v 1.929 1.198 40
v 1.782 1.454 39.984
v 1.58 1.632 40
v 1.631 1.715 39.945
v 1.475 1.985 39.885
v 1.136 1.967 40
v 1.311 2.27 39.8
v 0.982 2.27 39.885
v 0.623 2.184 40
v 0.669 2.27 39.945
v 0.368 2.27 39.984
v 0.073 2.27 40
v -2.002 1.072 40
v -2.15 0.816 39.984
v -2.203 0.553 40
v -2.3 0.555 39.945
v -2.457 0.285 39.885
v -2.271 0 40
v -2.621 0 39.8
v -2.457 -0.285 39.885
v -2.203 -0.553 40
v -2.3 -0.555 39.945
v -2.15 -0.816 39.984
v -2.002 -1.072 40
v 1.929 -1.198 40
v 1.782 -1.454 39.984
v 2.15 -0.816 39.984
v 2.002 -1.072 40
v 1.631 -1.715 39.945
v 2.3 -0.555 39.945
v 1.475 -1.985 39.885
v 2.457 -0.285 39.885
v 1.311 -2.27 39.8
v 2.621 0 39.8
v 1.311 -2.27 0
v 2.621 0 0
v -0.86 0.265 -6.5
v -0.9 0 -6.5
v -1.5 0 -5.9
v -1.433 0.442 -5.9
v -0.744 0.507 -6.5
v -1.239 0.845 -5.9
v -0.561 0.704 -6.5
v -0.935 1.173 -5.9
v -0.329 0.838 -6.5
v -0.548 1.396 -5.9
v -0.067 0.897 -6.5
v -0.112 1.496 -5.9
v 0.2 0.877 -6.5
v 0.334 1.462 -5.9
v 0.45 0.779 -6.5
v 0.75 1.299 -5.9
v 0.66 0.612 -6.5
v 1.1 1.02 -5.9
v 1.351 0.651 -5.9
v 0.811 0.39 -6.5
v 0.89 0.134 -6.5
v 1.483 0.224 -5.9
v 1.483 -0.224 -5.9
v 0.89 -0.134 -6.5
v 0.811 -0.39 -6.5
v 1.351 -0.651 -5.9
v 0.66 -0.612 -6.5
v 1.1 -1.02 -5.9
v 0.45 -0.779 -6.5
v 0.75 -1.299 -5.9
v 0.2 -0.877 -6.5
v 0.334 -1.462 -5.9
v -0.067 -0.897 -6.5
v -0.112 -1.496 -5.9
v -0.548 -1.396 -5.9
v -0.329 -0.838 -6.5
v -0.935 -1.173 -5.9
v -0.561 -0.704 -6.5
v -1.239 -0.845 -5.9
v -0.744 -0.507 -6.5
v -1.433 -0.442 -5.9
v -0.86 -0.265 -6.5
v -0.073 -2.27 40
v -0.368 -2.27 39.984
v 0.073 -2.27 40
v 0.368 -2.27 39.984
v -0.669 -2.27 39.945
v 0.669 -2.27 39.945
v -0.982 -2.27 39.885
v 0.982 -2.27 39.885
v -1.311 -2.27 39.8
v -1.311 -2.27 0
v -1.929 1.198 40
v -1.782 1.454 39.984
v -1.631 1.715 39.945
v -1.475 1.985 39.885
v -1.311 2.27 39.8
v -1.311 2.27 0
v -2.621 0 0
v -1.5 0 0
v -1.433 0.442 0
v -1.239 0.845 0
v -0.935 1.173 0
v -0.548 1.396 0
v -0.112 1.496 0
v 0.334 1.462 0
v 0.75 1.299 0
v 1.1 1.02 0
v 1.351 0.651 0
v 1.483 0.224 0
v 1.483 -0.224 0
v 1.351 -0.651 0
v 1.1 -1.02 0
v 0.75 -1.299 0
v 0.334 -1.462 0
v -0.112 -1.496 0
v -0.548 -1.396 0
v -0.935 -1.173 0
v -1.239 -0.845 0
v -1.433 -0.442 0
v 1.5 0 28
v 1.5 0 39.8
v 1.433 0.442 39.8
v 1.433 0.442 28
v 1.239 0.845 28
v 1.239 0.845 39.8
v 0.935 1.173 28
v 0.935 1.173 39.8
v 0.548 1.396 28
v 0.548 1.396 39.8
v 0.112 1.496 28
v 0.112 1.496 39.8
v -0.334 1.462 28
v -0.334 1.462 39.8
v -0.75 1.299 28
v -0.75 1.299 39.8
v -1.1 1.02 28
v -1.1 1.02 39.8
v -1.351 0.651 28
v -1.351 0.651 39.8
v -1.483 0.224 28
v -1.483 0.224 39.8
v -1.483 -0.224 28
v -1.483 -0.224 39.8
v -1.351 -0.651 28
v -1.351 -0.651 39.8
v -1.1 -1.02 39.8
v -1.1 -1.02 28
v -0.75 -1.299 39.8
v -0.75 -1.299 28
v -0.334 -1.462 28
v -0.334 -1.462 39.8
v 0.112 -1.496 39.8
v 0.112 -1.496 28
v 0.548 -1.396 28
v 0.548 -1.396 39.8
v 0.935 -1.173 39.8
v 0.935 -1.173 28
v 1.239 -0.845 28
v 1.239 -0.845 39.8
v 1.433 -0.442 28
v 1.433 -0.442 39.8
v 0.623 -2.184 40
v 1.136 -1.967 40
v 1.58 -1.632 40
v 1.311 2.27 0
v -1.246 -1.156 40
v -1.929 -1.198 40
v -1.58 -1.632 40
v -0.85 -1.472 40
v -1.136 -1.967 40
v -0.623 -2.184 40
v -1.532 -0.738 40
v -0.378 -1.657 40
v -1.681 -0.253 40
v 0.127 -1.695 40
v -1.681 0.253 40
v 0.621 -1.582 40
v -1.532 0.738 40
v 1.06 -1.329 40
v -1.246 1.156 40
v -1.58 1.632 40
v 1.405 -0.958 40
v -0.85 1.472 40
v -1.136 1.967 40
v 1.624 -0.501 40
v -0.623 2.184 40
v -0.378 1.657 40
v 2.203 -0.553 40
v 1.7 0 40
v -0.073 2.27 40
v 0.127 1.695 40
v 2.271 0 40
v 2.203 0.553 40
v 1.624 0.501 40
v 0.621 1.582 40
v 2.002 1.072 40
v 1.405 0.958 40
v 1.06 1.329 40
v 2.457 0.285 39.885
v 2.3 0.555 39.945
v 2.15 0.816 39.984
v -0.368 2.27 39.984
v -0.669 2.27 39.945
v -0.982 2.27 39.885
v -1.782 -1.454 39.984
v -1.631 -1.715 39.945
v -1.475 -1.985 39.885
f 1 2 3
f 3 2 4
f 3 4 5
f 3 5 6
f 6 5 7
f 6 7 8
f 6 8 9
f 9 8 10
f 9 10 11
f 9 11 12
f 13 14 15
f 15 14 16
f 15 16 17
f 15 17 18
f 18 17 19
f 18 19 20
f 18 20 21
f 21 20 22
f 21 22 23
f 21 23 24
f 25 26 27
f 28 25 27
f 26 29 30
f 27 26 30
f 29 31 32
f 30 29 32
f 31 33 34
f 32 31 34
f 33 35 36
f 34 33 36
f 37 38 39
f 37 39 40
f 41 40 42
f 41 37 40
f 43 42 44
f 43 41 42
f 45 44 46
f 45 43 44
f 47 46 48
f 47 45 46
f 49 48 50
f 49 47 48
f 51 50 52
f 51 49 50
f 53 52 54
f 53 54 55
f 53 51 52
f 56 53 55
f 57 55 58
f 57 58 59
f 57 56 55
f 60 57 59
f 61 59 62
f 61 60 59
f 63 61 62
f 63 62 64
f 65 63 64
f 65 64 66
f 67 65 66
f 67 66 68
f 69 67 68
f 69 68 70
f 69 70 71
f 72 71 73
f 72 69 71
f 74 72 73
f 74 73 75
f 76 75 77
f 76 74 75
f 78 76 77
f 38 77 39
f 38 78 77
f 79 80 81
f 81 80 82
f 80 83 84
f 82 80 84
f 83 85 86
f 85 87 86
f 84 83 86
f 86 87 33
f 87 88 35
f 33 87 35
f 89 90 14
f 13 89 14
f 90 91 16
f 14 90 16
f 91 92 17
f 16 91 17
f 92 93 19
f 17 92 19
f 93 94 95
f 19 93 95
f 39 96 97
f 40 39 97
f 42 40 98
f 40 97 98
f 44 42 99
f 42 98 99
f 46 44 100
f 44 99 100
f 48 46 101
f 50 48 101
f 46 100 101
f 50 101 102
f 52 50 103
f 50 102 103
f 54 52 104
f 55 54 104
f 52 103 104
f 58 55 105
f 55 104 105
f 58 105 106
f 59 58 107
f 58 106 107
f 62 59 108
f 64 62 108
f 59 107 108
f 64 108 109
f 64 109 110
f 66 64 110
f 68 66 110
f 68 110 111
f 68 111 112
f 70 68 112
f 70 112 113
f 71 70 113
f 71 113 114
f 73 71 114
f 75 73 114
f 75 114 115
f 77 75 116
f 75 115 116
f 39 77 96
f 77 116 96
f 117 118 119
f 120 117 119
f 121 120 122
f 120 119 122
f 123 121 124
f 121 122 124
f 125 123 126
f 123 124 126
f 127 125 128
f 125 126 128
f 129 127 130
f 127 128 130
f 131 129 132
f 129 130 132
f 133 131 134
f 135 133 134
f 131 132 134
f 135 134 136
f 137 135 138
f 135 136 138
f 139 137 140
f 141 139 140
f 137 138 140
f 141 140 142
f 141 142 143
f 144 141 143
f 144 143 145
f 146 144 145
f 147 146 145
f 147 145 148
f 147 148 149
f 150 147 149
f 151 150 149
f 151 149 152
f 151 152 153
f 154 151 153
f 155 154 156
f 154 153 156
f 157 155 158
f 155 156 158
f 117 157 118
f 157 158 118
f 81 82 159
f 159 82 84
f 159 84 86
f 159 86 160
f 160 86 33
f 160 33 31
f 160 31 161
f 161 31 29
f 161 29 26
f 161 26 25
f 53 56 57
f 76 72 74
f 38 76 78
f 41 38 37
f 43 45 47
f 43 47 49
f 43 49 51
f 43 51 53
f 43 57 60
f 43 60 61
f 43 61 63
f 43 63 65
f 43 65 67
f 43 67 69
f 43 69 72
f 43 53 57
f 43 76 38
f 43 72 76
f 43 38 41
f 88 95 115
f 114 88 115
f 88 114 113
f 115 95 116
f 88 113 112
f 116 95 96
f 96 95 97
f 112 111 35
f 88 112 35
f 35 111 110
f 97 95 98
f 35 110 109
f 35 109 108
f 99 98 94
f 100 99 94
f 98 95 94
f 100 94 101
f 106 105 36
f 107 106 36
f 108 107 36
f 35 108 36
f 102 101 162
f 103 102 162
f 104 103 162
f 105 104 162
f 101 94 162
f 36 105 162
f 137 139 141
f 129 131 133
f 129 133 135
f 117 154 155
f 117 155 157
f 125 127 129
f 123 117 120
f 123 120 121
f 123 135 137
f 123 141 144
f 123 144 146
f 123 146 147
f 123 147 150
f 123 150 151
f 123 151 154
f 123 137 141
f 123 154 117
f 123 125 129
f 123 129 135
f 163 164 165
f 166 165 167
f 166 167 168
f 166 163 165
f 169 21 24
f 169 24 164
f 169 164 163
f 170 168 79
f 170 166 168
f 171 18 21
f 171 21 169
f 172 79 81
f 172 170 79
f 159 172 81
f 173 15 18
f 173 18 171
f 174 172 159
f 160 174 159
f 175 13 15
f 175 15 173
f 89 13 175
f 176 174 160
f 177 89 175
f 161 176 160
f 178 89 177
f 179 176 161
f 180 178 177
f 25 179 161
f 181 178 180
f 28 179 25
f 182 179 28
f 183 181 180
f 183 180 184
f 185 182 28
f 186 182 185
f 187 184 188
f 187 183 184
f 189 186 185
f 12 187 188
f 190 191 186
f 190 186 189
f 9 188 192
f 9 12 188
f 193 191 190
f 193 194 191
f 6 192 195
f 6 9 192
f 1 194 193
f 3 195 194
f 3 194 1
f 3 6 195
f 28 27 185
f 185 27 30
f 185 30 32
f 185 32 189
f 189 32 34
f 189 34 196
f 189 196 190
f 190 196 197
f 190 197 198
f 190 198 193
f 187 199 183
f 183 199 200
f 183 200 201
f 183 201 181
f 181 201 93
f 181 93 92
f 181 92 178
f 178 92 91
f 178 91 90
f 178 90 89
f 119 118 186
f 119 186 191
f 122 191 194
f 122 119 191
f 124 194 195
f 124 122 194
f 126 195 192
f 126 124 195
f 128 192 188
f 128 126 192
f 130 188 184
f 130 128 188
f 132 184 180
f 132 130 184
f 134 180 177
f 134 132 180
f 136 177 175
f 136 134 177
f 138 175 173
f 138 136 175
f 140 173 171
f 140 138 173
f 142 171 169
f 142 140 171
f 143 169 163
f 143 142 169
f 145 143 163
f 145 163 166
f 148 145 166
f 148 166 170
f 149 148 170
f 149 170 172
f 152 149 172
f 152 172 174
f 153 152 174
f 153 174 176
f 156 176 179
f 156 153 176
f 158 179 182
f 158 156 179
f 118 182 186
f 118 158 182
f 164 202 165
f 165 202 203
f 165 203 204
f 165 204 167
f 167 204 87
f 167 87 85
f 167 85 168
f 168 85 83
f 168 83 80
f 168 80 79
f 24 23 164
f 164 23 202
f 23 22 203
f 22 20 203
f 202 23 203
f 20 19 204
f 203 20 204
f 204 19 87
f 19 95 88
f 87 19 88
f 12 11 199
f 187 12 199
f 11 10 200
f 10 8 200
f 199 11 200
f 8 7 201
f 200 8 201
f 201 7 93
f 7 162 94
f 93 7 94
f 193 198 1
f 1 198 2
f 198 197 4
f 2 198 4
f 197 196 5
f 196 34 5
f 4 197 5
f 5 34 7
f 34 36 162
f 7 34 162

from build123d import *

# Parameters (mm, degrees)
BOSS_EXTRUDE1_DEPTH     = 40
SKETCH2_R               = 1.5
CUT_EXTRUDE1_DEPTH      = 1
CUT_EXTRUDE1_DEPTH_BACK = 12
CHAMFER1_SIZE           = 0.2
SKETCH4_R               = 1.5
BOSS_EXTRUDE2_DEPTH     = 6.5
CHAMFER2_SIZE           = 0.6


with BuildPart() as part:
    # Sketch1 → Boss-Extrude1 (new body)
    with BuildSketch(Plane.XY):
        Polygon((2.621170222, 0), (1.310585111, 2.27), (-1.310585111, 2.27), (-2.621170222, 0), (-1.310585111, -2.27), (1.310585111, -2.27), align=None)
    extrude(amount=BOSS_EXTRUDE1_DEPTH)

    # Sketch2 → Cut-Extrude1 (cut, two sides)
    with BuildSketch(Plane.XY.offset(40)) as cut_extrude1_sk:
        Circle(SKETCH2_R)
    extrude(amount=CUT_EXTRUDE1_DEPTH, mode=Mode.SUBTRACT)
    extrude(cut_extrude1_sk.sketch, amount=-CUT_EXTRUDE1_DEPTH_BACK, mode=Mode.SUBTRACT)

    # Sketch3 → Cut-Revolve1 (revolve, cut)
    with BuildSketch(Plane(origin=(0, 0, 0), x_dir=(1, 0, 0), z_dir=(0, 1, 0))):
        Polygon((-2.621170222, -40), (-2.271170222, -40), (-2.621170222, -39.8), align=None)
    revolve(axis=Axis((0, 0, 28), (0, 0, 1)), mode=Mode.SUBTRACT)

    # Chamfer1
    chamfer1_edges = [part.edges().sort_by_distance(p)[0] for p in [
        (-1.5, 0, 40),
    ]]
    chamfer(chamfer1_edges, length=CHAMFER1_SIZE)

    # Sketch4 → Boss-Extrude2 (add)
    with BuildSketch(Plane(origin=(0, 0, 0), x_dir=(-1, 0, 0), z_dir=(0, 0, -1))):
        Circle(SKETCH4_R)
    extrude(amount=BOSS_EXTRUDE2_DEPTH)

    # Chamfer2
    chamfer2_edges = [part.edges().sort_by_distance(p)[0] for p in [
        (1.5, 0, -6.5),
    ]]
    chamfer(chamfer2_edges, length=CHAMFER2_SIZE)


solid = part.part
